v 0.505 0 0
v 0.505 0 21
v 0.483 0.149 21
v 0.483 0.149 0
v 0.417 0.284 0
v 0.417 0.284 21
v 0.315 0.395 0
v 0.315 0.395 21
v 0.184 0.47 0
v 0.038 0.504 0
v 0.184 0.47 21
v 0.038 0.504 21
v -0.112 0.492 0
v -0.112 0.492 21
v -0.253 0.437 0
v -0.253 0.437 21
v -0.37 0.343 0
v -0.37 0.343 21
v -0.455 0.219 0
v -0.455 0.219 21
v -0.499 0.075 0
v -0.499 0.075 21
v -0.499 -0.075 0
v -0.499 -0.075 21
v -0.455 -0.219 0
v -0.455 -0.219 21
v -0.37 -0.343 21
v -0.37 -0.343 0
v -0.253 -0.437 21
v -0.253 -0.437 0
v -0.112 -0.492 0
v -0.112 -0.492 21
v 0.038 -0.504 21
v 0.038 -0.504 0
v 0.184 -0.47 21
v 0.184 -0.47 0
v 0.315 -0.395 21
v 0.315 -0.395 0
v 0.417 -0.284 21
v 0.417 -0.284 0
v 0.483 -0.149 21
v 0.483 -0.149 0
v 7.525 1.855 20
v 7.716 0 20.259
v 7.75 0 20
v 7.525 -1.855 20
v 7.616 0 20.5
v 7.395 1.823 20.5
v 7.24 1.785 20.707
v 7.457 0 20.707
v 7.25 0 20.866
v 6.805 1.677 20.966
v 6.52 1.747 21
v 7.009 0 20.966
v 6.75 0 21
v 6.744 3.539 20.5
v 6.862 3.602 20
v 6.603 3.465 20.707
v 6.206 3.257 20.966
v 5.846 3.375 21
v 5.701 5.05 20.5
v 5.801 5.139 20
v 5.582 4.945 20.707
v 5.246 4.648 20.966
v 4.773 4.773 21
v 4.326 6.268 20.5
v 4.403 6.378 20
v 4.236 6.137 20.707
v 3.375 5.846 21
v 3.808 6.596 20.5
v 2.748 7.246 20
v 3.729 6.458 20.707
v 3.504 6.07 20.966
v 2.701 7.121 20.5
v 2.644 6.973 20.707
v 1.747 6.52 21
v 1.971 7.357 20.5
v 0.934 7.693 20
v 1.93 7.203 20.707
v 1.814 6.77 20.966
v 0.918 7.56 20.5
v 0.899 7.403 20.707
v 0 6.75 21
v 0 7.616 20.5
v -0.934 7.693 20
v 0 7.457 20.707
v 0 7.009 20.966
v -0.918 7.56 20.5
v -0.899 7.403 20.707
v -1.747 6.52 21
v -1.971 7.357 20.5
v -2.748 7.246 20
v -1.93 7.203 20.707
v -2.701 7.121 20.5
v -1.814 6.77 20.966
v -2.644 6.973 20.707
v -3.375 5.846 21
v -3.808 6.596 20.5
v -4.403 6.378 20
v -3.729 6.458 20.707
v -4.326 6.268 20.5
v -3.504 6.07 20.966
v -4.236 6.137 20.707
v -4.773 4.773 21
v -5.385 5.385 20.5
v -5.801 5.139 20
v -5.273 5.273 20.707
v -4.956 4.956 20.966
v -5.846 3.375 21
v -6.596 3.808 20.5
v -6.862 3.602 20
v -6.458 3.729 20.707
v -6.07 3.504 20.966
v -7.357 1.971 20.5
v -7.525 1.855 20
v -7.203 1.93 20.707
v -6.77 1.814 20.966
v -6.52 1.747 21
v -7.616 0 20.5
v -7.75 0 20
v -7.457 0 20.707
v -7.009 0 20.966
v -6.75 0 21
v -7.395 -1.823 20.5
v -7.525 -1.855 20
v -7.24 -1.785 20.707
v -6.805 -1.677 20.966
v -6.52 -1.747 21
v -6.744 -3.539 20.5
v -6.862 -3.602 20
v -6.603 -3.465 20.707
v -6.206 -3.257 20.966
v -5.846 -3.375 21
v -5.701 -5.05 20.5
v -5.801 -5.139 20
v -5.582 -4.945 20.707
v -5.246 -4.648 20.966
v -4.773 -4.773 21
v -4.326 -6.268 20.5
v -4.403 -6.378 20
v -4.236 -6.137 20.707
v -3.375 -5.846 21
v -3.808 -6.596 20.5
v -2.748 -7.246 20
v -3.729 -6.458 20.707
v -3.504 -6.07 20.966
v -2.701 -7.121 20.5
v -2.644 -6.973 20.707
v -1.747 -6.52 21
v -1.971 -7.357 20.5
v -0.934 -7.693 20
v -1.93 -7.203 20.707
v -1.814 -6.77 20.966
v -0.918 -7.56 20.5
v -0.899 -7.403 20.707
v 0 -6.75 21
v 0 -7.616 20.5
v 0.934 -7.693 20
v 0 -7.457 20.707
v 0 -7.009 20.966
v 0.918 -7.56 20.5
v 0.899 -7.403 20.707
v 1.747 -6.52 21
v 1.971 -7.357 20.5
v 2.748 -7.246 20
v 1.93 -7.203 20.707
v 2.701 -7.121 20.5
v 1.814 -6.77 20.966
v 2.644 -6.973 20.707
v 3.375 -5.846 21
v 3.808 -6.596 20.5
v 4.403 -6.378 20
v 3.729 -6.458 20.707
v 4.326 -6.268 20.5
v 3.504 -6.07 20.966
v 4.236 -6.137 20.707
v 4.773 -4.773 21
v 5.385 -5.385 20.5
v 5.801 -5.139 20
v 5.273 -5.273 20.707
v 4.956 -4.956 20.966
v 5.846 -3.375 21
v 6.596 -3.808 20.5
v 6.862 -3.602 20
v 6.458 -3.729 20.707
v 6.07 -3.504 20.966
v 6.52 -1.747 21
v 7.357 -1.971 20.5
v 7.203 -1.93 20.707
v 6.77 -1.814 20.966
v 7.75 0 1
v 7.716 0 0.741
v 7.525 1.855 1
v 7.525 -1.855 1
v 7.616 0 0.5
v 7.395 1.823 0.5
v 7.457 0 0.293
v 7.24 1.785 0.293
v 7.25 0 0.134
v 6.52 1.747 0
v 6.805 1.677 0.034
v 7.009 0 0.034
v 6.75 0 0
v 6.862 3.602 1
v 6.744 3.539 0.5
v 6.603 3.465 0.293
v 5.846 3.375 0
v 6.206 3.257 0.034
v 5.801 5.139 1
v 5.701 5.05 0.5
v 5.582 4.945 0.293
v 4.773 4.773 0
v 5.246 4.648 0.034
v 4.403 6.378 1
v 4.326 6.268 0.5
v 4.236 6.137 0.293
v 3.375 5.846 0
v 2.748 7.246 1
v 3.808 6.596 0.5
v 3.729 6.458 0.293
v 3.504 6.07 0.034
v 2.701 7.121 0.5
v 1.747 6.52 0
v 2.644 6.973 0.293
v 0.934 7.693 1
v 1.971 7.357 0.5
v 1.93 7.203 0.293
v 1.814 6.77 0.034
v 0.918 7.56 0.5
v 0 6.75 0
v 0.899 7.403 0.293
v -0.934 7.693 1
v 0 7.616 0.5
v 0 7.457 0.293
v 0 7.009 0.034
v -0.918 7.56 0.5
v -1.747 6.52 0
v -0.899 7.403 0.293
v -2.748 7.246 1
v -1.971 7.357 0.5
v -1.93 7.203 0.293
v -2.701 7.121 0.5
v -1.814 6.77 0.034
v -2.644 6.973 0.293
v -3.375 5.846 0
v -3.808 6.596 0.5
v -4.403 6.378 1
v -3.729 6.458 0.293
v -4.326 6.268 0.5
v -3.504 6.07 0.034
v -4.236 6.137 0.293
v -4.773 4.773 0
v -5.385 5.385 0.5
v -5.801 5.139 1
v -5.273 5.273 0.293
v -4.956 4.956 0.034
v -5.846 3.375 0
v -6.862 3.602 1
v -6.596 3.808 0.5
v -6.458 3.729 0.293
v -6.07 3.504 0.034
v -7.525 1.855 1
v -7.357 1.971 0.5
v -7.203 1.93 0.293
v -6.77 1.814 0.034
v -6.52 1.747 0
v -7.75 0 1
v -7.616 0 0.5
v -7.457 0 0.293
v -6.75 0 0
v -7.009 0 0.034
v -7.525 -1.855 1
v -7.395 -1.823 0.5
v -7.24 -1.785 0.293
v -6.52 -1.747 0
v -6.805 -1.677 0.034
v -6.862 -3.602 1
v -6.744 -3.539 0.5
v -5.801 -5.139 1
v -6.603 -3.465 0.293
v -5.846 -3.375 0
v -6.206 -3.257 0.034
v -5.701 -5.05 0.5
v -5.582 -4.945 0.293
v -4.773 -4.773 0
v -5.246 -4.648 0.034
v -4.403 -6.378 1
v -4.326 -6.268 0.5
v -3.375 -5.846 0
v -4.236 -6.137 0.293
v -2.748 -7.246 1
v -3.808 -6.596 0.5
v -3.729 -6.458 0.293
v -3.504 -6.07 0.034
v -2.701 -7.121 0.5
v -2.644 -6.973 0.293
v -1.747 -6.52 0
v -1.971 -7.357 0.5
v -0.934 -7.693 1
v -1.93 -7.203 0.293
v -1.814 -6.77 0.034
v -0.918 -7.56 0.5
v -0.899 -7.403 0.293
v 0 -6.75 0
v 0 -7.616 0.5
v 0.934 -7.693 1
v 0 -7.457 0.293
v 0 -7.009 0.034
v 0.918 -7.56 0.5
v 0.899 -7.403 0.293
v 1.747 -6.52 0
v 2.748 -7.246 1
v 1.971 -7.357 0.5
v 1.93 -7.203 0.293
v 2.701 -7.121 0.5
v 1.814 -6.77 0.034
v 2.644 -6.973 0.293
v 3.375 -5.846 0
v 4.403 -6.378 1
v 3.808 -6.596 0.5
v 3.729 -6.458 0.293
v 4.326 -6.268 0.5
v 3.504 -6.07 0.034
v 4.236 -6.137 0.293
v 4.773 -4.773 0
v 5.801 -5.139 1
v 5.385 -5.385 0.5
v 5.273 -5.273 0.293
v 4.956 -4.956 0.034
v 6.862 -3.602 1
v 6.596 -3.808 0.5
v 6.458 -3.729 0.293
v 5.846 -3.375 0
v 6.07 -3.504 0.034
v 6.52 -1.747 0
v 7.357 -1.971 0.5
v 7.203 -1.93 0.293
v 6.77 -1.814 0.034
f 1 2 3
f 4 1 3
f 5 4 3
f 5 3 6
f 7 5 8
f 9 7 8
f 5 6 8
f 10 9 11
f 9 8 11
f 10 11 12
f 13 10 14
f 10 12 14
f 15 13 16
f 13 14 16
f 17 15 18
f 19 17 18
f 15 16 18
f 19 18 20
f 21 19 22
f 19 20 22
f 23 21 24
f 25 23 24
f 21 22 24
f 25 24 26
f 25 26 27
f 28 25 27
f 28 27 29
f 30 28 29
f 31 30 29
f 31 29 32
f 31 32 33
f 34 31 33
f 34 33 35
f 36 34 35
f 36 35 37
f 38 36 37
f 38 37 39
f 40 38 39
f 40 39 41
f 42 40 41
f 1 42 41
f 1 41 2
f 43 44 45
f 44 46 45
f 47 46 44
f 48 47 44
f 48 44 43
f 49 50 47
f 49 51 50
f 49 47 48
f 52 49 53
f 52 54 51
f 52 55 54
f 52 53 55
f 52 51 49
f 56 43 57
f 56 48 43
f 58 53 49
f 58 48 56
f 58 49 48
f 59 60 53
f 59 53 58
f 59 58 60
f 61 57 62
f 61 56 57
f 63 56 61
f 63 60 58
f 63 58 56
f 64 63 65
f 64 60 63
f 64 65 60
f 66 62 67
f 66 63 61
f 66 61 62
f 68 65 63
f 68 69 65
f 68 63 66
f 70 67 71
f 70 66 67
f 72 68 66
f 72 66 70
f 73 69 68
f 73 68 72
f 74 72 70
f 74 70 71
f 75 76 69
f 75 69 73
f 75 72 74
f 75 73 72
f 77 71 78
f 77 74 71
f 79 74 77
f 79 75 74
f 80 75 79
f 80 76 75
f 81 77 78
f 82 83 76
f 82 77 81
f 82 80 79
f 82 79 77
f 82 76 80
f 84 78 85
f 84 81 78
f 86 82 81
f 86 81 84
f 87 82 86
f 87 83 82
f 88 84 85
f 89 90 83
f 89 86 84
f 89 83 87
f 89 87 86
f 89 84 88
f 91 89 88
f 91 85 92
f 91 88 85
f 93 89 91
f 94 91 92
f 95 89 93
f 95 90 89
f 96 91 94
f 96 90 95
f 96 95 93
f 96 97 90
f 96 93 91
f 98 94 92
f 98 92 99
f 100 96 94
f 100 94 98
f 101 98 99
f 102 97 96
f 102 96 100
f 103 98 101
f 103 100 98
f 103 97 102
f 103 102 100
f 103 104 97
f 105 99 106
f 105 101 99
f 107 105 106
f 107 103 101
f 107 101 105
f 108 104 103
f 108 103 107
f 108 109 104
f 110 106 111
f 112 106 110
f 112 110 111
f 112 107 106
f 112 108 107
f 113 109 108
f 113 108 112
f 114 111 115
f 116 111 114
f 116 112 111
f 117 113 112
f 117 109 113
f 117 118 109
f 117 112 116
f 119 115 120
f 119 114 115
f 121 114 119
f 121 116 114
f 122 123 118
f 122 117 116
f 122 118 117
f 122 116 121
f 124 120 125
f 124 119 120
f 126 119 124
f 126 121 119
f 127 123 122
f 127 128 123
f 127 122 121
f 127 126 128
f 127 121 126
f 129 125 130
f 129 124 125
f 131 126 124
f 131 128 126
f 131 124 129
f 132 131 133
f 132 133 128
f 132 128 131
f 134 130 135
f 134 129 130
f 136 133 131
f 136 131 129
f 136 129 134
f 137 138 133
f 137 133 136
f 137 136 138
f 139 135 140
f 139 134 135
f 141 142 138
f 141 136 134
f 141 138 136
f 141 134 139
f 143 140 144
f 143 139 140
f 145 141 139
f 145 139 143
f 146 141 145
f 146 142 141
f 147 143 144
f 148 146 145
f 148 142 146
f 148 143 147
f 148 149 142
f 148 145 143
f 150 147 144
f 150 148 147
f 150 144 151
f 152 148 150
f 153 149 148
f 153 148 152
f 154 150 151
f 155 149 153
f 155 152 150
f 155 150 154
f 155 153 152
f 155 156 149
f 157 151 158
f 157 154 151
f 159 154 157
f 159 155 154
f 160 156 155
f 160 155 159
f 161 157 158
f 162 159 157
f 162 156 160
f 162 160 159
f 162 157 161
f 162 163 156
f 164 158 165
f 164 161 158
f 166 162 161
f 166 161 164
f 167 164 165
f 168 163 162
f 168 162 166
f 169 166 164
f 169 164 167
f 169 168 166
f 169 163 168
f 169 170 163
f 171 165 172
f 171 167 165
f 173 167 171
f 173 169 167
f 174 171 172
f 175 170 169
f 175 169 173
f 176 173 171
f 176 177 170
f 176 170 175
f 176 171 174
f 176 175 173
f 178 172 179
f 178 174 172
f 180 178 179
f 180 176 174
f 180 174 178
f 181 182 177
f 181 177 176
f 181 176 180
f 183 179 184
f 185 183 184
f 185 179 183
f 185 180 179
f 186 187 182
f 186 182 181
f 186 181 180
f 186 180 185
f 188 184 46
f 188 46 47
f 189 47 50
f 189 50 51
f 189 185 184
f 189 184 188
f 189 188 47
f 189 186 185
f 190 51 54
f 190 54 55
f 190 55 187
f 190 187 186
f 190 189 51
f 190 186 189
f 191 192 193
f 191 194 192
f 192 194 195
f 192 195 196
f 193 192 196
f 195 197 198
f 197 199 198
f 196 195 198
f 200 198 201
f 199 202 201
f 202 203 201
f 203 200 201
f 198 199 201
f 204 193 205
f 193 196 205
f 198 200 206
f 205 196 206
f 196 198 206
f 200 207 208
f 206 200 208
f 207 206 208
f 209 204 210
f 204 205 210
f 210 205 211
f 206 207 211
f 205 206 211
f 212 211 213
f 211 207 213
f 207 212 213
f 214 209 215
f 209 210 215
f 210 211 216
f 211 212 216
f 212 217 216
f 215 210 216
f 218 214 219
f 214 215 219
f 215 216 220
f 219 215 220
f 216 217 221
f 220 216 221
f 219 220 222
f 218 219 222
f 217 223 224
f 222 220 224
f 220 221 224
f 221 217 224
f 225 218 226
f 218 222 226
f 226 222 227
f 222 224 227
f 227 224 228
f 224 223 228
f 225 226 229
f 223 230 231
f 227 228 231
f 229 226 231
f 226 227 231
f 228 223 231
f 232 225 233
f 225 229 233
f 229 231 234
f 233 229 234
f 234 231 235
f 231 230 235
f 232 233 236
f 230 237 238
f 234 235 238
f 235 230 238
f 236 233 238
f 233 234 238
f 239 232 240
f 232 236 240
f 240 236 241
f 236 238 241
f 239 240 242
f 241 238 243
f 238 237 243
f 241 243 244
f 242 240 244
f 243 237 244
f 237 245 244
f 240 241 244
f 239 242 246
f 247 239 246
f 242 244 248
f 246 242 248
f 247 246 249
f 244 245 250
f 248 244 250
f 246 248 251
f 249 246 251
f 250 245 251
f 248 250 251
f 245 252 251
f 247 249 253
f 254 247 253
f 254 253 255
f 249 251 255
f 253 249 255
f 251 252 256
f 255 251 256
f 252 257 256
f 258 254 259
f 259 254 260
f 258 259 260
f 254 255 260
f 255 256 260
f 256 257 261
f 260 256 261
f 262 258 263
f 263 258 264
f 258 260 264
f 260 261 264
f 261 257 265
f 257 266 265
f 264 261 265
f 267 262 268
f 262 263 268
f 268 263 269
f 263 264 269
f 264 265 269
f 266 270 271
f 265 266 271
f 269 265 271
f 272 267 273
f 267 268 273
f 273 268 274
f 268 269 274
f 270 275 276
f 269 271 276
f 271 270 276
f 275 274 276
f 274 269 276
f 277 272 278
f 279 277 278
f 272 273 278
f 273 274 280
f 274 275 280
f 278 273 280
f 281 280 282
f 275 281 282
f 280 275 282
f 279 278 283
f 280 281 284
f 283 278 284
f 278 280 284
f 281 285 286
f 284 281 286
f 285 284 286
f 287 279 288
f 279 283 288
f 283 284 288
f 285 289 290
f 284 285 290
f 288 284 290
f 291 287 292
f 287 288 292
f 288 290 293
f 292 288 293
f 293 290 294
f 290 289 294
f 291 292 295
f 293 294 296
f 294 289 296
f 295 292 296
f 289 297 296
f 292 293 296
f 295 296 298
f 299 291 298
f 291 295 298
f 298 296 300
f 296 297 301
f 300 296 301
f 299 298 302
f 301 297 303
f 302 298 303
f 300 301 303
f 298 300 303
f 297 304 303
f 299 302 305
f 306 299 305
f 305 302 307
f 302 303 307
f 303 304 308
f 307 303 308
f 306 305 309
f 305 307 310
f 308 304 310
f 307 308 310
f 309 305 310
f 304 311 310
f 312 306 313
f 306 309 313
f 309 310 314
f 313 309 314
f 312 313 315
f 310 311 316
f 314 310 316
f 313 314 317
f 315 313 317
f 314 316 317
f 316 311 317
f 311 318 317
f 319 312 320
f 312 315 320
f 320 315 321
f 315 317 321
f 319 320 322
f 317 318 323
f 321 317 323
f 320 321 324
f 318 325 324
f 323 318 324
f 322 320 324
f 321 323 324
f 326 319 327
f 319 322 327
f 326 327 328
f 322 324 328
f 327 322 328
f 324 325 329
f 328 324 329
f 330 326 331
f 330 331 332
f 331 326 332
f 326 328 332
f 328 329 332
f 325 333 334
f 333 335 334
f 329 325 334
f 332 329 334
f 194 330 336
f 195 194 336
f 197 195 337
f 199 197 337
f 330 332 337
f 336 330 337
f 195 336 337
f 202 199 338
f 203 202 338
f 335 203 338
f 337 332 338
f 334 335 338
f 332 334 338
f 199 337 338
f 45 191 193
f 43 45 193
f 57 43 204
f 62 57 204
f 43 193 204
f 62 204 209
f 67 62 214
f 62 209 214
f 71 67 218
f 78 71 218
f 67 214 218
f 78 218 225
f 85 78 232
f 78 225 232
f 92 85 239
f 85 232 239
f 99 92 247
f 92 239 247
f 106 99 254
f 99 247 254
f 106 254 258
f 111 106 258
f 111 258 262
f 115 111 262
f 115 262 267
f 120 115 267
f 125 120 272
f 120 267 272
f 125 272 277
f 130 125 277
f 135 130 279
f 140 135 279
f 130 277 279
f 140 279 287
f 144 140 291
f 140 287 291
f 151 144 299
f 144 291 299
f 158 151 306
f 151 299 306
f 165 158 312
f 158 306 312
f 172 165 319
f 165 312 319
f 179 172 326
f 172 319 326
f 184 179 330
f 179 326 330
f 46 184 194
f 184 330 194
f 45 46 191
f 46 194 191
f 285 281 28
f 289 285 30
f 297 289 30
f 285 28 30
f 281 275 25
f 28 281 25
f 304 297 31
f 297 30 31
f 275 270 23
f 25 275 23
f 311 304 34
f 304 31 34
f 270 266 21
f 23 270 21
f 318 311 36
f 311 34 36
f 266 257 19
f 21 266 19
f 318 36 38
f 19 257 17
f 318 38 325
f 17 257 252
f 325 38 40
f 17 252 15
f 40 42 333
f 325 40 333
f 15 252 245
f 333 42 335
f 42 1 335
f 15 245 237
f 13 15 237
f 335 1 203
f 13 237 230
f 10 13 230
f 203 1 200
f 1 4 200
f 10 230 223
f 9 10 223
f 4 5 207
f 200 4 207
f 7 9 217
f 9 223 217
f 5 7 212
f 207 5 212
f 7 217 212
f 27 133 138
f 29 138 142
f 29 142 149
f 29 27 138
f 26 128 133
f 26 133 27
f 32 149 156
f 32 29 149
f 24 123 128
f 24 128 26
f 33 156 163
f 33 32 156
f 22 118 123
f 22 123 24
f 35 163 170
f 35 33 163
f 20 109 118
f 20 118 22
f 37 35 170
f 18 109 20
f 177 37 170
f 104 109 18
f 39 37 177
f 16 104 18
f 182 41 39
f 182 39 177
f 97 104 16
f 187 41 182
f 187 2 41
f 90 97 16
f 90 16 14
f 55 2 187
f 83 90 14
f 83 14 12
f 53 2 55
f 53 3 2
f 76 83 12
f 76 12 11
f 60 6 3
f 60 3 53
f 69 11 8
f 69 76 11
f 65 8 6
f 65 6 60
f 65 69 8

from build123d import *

# Parameters (mm, degrees)
SKETCH1_R           = 7.75
BOSS_EXTRUDE1_DEPTH = 21
FILLET1_R           = 1
SKETCH2_R           = 0.505
CUT_EXTRUDE1_DEPTH  = 51.7


with BuildPart() as part:
    # Sketch1 → Boss-Extrude1 (new body)
    with BuildSketch(Plane.XY):
        Circle(SKETCH1_R)
    extrude(amount=BOSS_EXTRUDE1_DEPTH)

    # Fillet1
    fillet1_edges = [part.edges().sort_by_distance(p)[0] for p in [
        (-7.75, 0, 0),
        (-7.75, 0, 21),
    ]]
    fillet(fillet1_edges, radius=FILLET1_R)

    # Sketch2 → Cut-Extrude1 (cut)
    with BuildSketch(Plane.XY.offset(21)):
        Circle(SKETCH2_R)
    extrude(amount=-CUT_EXTRUDE1_DEPTH, mode=Mode.SUBTRACT)


solid = part.part
